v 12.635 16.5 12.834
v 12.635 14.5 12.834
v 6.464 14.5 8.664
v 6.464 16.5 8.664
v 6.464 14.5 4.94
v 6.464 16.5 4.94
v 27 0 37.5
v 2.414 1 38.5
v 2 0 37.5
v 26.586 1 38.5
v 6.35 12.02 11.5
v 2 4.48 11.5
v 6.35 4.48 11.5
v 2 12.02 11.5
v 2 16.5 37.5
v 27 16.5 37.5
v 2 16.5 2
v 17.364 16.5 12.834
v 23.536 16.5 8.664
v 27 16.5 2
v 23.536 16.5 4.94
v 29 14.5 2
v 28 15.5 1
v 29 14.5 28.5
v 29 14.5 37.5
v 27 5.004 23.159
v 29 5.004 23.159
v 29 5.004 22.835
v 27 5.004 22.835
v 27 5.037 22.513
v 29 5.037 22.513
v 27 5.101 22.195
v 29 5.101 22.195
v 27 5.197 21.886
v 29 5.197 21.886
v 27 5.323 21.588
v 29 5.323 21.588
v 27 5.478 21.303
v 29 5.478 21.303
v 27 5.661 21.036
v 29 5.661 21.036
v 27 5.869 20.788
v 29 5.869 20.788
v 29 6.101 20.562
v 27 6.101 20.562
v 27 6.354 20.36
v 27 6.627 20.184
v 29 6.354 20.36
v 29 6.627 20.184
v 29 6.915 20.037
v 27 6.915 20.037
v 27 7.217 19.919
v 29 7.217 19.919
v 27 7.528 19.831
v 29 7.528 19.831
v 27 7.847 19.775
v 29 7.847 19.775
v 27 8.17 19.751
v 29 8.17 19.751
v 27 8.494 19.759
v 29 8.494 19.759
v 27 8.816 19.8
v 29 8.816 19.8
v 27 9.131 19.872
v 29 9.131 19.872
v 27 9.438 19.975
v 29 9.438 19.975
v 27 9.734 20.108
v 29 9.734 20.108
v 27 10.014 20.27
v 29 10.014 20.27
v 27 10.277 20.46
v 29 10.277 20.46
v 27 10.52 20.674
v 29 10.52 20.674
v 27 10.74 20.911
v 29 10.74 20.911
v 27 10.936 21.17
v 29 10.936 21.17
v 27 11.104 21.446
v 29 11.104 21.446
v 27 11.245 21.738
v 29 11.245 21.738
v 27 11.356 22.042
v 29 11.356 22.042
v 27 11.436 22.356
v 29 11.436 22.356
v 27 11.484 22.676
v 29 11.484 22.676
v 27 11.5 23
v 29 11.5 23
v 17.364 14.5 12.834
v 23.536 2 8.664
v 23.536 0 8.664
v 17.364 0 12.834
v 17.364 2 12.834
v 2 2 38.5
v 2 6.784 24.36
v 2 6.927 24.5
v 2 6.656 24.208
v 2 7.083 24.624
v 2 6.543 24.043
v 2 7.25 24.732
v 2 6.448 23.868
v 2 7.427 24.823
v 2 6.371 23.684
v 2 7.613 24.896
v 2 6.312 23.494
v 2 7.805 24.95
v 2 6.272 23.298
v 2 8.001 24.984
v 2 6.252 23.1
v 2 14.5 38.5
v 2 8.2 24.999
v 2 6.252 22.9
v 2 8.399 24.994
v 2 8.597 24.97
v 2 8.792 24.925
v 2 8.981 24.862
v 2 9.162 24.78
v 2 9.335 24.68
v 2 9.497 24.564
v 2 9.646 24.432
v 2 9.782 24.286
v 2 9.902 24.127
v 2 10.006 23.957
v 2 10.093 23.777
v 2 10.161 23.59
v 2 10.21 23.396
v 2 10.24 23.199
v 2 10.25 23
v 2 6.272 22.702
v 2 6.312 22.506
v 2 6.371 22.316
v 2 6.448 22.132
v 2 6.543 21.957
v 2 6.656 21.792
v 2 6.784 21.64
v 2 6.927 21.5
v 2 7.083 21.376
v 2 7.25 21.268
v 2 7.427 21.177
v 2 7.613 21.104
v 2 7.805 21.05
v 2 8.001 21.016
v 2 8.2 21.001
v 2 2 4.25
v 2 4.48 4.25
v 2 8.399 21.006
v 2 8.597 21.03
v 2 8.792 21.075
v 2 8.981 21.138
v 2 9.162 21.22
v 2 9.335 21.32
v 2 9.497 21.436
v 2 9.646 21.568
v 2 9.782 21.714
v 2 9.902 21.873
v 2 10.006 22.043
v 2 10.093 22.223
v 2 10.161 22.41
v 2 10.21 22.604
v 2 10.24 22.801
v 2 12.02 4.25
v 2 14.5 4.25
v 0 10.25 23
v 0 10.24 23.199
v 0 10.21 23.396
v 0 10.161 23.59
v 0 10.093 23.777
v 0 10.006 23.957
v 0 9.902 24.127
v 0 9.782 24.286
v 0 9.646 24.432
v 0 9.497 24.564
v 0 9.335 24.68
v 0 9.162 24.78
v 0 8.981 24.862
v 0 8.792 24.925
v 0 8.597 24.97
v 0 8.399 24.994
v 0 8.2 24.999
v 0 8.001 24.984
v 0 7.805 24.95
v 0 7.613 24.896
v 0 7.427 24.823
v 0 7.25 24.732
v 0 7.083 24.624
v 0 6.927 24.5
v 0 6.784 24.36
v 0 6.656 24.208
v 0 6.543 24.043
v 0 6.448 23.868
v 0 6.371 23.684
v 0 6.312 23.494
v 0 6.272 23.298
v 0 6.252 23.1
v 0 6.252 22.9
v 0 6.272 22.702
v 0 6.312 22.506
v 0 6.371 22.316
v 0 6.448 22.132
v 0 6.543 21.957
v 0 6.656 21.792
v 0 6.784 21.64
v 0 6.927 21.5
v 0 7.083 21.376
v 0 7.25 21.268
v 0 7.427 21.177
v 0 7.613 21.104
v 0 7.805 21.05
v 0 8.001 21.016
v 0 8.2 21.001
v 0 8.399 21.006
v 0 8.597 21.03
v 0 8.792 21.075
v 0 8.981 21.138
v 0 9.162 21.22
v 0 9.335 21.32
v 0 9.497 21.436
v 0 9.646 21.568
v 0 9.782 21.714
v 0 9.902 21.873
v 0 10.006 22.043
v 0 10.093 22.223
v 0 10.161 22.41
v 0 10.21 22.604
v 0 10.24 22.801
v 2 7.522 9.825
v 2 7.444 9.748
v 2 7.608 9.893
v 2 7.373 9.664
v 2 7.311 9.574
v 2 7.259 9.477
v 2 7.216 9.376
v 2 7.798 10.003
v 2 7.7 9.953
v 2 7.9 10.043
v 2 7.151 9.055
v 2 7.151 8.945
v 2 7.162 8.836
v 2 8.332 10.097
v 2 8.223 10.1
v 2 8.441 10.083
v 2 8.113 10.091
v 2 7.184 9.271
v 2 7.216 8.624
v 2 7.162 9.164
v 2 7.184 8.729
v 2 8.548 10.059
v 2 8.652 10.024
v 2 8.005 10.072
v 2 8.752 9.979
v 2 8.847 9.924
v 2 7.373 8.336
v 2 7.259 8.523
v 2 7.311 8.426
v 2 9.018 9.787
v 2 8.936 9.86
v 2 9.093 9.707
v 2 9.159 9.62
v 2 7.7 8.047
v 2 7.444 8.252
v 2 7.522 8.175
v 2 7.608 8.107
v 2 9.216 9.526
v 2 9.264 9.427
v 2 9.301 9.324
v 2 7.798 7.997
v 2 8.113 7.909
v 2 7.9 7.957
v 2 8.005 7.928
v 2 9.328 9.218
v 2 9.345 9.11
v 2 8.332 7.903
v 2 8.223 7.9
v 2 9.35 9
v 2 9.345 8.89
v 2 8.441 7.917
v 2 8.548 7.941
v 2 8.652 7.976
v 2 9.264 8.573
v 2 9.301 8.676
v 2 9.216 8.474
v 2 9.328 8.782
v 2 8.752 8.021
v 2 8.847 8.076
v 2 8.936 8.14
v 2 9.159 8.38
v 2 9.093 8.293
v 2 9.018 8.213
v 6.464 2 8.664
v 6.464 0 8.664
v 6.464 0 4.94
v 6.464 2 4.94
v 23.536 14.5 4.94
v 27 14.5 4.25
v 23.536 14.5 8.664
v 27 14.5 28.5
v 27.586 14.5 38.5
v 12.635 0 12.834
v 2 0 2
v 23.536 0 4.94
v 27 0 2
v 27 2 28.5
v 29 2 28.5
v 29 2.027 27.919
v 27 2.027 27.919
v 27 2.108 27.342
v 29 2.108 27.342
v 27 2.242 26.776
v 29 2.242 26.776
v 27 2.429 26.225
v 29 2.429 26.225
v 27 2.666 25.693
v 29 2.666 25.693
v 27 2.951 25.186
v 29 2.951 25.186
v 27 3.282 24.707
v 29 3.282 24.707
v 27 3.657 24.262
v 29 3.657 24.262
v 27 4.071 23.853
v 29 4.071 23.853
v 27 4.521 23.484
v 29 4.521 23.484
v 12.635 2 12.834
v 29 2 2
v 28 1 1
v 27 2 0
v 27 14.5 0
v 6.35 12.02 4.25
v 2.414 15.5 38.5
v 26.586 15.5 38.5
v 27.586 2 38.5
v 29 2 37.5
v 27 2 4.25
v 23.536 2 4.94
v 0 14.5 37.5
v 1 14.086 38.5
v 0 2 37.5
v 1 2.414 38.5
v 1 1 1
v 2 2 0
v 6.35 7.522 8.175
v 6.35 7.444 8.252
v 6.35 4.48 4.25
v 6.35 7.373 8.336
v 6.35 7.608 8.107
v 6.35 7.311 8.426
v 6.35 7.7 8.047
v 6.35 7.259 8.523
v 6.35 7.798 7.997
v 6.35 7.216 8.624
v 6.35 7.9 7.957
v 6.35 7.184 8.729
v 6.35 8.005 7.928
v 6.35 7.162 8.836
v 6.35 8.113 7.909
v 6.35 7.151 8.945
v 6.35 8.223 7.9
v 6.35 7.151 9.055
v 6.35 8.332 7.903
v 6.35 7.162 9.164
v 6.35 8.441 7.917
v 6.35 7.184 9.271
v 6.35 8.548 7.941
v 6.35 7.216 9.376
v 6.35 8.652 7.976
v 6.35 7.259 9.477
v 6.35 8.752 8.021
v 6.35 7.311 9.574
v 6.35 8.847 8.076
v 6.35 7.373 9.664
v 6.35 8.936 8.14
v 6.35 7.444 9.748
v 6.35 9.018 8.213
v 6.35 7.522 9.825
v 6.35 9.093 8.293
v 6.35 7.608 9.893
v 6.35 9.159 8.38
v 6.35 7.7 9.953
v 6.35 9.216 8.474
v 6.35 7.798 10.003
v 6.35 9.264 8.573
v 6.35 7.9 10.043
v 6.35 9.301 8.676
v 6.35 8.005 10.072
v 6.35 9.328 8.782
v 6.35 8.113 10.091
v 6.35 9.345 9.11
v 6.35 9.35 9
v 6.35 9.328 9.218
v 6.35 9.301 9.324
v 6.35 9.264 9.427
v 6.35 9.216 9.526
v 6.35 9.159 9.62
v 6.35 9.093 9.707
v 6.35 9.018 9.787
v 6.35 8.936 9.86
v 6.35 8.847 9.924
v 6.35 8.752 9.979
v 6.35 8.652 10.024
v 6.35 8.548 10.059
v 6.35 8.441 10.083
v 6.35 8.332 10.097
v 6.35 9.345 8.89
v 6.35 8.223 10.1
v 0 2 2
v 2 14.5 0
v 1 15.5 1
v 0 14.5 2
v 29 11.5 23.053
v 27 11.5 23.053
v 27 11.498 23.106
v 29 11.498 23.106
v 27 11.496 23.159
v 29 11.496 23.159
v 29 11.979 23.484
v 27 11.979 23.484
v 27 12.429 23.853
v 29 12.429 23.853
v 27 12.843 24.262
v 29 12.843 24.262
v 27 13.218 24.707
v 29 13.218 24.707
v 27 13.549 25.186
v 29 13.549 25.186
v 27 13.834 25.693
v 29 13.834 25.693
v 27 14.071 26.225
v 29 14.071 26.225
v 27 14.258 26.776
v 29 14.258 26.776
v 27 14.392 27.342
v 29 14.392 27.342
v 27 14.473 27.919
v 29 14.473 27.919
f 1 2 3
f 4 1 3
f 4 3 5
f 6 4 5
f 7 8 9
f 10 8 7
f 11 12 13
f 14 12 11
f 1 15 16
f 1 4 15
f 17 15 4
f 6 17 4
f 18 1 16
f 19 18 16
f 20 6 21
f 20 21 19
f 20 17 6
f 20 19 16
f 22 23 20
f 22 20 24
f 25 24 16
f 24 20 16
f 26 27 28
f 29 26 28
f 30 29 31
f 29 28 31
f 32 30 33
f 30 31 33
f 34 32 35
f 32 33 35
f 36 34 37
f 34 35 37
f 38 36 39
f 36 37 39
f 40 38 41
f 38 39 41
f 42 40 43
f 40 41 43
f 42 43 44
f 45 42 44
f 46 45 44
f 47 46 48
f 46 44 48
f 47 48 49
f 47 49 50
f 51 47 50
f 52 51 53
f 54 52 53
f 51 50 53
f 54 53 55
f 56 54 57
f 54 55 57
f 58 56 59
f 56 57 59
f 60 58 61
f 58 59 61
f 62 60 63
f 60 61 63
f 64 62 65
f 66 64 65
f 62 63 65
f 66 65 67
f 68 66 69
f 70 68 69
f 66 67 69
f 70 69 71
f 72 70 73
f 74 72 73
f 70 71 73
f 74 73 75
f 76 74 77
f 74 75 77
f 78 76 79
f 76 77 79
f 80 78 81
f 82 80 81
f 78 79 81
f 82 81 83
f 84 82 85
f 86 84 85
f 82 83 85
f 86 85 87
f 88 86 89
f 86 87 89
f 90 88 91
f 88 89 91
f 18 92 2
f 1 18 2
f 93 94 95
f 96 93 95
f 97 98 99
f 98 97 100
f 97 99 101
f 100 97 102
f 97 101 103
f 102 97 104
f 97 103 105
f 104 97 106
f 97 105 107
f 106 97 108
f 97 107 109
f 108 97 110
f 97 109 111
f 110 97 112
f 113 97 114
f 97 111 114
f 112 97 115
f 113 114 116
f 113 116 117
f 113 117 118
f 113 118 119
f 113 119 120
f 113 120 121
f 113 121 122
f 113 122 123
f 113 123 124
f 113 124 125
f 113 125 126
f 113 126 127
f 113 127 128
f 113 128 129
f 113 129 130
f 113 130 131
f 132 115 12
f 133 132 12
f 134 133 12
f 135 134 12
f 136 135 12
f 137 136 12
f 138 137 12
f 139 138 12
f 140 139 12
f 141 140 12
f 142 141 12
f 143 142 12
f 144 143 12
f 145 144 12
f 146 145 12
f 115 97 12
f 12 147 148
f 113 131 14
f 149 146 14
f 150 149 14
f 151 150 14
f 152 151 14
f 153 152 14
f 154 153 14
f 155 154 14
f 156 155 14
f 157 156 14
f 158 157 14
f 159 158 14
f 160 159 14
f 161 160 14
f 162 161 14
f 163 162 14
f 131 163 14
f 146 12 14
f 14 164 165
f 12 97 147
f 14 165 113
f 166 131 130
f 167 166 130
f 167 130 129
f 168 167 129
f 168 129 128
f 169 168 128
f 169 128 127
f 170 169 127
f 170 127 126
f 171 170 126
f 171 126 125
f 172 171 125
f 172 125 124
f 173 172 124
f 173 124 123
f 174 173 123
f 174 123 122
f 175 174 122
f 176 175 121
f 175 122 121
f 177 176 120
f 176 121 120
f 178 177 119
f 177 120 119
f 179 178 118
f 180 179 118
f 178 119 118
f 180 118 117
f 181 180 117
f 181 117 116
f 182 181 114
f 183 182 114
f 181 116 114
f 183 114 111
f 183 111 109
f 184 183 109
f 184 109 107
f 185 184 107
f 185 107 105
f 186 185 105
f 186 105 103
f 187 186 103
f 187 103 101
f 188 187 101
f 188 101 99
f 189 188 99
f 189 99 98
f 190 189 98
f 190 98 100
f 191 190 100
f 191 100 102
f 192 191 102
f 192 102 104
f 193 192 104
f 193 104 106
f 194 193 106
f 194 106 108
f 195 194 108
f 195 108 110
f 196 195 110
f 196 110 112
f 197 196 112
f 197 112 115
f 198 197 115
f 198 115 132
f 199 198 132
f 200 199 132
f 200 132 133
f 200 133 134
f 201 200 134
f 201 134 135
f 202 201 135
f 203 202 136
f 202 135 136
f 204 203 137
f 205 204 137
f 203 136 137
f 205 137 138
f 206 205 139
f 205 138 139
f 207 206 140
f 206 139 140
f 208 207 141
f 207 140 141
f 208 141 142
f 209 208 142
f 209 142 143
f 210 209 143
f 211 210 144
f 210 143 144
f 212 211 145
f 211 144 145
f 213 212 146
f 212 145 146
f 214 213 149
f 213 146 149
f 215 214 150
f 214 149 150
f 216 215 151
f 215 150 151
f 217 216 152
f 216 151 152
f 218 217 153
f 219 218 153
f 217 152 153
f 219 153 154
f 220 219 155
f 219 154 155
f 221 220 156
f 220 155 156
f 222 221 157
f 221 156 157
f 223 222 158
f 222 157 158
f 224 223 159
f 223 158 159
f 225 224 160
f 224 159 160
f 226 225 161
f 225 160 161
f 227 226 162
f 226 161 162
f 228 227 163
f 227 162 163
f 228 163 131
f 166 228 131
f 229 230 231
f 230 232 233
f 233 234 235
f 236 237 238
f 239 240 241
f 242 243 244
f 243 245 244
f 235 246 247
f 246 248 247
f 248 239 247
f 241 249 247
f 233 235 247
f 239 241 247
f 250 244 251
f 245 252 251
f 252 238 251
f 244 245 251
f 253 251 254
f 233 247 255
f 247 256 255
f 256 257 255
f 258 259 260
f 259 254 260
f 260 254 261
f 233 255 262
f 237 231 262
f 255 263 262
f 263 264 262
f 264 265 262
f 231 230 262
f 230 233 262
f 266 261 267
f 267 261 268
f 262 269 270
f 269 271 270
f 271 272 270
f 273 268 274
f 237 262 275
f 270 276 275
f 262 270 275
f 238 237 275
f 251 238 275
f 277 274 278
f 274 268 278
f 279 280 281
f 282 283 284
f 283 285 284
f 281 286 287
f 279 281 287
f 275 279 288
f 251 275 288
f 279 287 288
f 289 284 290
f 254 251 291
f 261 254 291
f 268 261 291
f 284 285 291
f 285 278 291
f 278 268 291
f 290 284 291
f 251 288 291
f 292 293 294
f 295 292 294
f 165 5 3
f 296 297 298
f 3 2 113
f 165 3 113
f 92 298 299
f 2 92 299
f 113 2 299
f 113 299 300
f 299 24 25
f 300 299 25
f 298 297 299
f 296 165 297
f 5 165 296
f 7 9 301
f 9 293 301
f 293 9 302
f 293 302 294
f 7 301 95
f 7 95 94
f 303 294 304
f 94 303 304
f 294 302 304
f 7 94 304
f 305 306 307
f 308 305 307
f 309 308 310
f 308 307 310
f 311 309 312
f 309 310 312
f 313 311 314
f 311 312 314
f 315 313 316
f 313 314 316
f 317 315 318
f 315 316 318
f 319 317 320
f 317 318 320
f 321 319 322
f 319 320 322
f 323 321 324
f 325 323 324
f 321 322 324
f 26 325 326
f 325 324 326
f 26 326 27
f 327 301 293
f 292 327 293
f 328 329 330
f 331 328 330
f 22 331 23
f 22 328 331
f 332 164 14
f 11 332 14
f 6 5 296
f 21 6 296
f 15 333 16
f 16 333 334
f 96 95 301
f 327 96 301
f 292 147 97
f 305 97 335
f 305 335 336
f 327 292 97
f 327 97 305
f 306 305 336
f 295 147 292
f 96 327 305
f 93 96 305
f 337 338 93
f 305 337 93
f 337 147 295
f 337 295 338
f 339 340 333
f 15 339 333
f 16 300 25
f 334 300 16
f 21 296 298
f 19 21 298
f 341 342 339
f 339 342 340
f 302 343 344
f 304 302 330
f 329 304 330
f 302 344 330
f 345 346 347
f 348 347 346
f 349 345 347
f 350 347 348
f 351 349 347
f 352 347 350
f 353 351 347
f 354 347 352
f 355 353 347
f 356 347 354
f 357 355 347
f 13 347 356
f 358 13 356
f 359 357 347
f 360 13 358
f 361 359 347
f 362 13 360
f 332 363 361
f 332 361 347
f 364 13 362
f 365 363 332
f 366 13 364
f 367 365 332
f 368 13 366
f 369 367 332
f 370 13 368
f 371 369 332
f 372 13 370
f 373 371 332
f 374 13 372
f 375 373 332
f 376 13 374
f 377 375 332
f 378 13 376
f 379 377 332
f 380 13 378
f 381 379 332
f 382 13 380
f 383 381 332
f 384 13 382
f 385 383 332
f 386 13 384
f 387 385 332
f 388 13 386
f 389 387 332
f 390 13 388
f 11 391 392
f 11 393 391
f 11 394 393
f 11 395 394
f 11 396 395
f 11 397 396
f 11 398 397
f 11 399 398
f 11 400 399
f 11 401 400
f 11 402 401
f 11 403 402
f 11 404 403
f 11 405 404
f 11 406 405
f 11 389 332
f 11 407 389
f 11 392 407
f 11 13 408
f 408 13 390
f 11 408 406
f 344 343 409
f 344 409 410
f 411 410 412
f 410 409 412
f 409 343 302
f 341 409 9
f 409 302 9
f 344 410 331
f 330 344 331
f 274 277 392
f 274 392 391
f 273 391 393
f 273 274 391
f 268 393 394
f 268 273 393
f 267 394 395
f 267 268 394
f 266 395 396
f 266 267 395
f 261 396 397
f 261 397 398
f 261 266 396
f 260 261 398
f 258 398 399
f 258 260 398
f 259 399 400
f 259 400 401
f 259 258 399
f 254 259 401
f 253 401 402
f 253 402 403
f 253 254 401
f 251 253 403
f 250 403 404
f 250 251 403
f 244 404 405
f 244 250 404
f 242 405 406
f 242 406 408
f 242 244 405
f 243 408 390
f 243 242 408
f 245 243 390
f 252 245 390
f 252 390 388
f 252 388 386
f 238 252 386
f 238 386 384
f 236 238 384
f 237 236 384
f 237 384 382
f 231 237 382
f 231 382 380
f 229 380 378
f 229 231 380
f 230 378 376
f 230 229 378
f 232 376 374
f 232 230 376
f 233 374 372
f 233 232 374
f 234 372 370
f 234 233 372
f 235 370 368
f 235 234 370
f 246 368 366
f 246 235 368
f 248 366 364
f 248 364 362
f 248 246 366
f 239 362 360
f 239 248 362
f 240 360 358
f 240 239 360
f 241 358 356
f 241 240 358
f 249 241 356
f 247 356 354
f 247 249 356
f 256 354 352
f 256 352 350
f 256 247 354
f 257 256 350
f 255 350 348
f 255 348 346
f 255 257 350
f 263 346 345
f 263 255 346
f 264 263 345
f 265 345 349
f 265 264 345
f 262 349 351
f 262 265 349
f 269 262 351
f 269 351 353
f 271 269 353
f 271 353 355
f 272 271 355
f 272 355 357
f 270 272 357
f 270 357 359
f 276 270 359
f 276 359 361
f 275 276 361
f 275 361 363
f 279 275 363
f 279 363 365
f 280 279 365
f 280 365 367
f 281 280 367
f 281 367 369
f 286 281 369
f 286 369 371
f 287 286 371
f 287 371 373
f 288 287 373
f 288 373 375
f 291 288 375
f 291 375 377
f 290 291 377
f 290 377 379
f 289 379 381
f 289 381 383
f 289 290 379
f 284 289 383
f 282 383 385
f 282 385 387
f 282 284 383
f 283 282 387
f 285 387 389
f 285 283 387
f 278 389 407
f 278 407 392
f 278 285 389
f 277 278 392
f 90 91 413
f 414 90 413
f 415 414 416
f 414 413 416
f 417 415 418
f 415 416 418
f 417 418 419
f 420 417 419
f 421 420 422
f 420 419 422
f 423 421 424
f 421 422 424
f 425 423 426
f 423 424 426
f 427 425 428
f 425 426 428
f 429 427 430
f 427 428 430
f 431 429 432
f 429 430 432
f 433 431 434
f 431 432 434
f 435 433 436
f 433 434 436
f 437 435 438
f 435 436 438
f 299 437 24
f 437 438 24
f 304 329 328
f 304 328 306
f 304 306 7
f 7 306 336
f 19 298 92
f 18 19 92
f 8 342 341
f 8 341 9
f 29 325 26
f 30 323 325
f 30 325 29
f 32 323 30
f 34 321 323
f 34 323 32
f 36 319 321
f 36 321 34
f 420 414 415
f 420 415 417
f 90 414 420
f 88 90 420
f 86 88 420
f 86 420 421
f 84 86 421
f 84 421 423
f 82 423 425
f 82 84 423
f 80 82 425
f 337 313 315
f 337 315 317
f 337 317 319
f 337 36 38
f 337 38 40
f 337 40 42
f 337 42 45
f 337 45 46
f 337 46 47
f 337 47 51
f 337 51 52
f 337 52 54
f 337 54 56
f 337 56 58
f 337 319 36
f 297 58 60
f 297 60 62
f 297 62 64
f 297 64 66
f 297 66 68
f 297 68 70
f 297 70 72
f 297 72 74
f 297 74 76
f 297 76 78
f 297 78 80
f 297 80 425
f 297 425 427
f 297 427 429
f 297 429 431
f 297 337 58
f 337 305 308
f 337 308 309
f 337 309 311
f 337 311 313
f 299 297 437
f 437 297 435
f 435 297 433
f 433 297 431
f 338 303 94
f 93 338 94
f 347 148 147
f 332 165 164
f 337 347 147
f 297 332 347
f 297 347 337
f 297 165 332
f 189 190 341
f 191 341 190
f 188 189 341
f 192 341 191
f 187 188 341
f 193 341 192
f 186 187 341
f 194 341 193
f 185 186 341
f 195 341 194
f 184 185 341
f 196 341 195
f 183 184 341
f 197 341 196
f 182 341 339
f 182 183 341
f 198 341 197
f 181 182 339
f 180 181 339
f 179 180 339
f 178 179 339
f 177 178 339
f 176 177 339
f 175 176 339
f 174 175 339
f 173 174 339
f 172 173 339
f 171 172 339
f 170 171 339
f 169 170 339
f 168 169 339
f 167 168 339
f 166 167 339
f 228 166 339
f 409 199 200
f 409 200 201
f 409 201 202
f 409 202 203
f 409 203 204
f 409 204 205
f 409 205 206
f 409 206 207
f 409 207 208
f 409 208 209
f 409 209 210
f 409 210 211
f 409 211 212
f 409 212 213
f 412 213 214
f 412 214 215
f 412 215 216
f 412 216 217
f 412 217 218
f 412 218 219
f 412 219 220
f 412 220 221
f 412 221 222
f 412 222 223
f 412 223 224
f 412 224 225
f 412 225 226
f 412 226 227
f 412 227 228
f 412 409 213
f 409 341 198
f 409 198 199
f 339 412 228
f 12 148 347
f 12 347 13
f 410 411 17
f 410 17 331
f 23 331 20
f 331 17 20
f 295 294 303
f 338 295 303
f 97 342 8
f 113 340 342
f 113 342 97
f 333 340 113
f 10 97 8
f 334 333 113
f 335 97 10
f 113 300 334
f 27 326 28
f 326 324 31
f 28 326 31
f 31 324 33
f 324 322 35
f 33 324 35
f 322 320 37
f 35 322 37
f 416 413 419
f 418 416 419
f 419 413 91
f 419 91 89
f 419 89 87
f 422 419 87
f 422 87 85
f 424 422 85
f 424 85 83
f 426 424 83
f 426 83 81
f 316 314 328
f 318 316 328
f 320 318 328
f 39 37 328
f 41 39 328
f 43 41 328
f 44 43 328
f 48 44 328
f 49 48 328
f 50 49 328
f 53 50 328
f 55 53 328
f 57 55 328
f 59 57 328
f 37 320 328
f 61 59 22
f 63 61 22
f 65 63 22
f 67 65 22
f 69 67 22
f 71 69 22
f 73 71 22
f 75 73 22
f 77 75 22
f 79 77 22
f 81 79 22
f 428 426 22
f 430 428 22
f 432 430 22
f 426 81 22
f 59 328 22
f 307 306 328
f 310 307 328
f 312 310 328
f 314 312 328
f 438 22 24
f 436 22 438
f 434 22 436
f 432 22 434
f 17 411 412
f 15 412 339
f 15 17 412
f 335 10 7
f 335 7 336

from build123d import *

# Parameters (mm, degrees)
F0_W      = 29
F0_H      = 16.5
F1_DEPTH  = 38.5
F2_T      = -2
F3_DEPTH  = 2.25
F4_SIZE   = 2
F5_SIZE   = 2
F6_SIZE   = 1
F8_DEPTH  = 16.501
F10_DEPTH = 2
F11_R     = 2
F12_DEPTH = 2.001
F13_W     = 7.54
F13_H     = 7.25
F13_R     = 1.1
F14_DEPTH = 4.35


with BuildPart() as f1:
    # F0 (on Top) → F1 (new body)
    with BuildSketch(Plane.XY):
        with Locations((14.5, 8.25)):
            Rectangle(F0_W, F0_H)
    extrude(amount=F1_DEPTH)

    # F2
    f2_openings = [f1.faces().sort_by_distance(p)[0] for p in [
        (14.5, 8.25, 38.5),
    ]]
    offset(amount=F2_T, openings=f2_openings)

    # F3 (add): a face of the model
    f3_faces = [f1.faces().sort_by_distance(p)[0] for p in [
        (14.5, 8.25, 2),
    ]]
    extrude(f3_faces, amount=F3_DEPTH)

    # F4
    f4_edges = [f1.edges().sort_by_distance(p)[0] for p in [
        (29, 0, 19.25),
        (29, 16.5, 19.25),
        (0, 16.5, 19.25),
        (0, 0, 19.25),
    ]]
    chamfer(f4_edges, length=F4_SIZE)

    # F5 (call 1 of 4: OpenCascade refuses the feature's edges together)
    f5_edges = [f1.edges().sort_by_distance(p)[0] for p in [
        (14.5, 0, 0),
    ]]
    chamfer(f5_edges, length=F5_SIZE)

    # F5#2 (call 2 of 4)
    f5_2_edges = [f1.edges().sort_by_distance(p)[0] for p in [
        (29, 8.25, 0),
    ]]
    chamfer(f5_2_edges, length=F5_SIZE)

    # F5#3 (call 3 of 4)
    f5_3_edges = [f1.edges().sort_by_distance(p)[0] for p in [
        (0, 8.25, 0),
    ]]
    chamfer(f5_3_edges, length=F5_SIZE)

    # F5#4 (call 4 of 4)
    f5_4_edges = [f1.edges().sort_by_distance(p)[0] for p in [
        (14.5, 16.5, 0),
    ]]
    chamfer(f5_4_edges, length=F5_SIZE)

    # F6
    f6_edges = [f1.edges().sort_by_distance(p)[0] for p in [
        (29, 8.25, 38.5),
        (28, 15.5, 38.5),
        (14.5, 16.5, 38.5),
        (1, 15.5, 38.5),
        (0, 8.25, 38.5),
        (1, 1, 38.5),
        (14.5, 0, 38.5),
        (28, 1, 38.5),
    ]]
    chamfer(f6_edges, length=F6_SIZE)

    # F7 (on face) → F8 (cut, through all)
    with BuildSketch(Plane.XZ):
        Polygon((6.464, 8.664), (6.464, 4.94), (23.536, 4.94), (23.536, 8.664), (17.364, 12.834), (12.635, 12.834), align=None)
    extrude(amount=-F8_DEPTH, mode=Mode.SUBTRACT)

    # F9 (on face) → F10 (cut, through all)
    with BuildSketch(Plane.YZ.offset(29)):
        with BuildLine():
            ThreePointArc((5.0038961688, 23.1590909091), (8.1704306945, 19.7509741882), (11.5, 23))
            ThreePointArc((11.5, 23), (11.4990258118, 23.0795693055), (11.4961038312, 23.1590909091))
            ThreePointArc((11.4961038312, 23.1590909091), (8.25, 22.25), (5.0038961688, 23.1590909091))
        make_face()
        with BuildLine():
            ThreePointArc((5.0038961688, 23.1590909091), (8.25, 22.25), (11.4961038312, 23.1590909091))
            ThreePointArc((11.4961038312, 23.1590909091), (8.25, 26.25), (5.0038961688, 23.1590909091))
        make_face()
        with BuildLine():
            ThreePointArc((5.0038961688, 23.1590909091), (8.25, 26.25), (11.4961038312, 23.1590909091))
            ThreePointArc((11.4961038312, 23.1590909091), (13.6975062618, 25.4361502113), (14.5, 28.5))
            Line((14.5, 28.5), (2, 28.5))
            ThreePointArc((2, 28.5), (2.8024937382, 25.4361502113), (5.0038961688, 23.1590909091))
        make_face()
        with BuildLine():
            Line((2, 28.5), (14.5, 28.5))
            ThreePointArc((14.5, 28.5), (8.25, 34.75), (2, 28.5))
        make_face()
        with BuildLine():
            ThreePointArc((2, 28.5), (8.25, 34.75), (14.5, 28.5))
            Line((14.5, 28.5), (14.5, 38.5))
            Line((14.5, 38.5), (2, 38.5))
            Line((2, 38.5), (2, 28.5))
        make_face()
    extrude(amount=-F10_DEPTH, mode=Mode.SUBTRACT)

    # F11 (on face) → F12 (cut, through all)
    with BuildSketch(Plane.YZ.offset(2)):
        with Locations((8.25, 23)):
            Circle(F11_R)
    extrude(amount=-F12_DEPTH, mode=Mode.SUBTRACT)

    # F13 (on face) → F14 (join)
    with BuildSketch(Plane.YZ.offset(2)):
        with Locations((8.25, 7.875)):
            Rectangle(F13_W, F13_H)
        with Locations((8.25, 9)):
            Circle(F13_R, mode=Mode.SUBTRACT)
    extrude(amount=F14_DEPTH)


solid = f1.part
